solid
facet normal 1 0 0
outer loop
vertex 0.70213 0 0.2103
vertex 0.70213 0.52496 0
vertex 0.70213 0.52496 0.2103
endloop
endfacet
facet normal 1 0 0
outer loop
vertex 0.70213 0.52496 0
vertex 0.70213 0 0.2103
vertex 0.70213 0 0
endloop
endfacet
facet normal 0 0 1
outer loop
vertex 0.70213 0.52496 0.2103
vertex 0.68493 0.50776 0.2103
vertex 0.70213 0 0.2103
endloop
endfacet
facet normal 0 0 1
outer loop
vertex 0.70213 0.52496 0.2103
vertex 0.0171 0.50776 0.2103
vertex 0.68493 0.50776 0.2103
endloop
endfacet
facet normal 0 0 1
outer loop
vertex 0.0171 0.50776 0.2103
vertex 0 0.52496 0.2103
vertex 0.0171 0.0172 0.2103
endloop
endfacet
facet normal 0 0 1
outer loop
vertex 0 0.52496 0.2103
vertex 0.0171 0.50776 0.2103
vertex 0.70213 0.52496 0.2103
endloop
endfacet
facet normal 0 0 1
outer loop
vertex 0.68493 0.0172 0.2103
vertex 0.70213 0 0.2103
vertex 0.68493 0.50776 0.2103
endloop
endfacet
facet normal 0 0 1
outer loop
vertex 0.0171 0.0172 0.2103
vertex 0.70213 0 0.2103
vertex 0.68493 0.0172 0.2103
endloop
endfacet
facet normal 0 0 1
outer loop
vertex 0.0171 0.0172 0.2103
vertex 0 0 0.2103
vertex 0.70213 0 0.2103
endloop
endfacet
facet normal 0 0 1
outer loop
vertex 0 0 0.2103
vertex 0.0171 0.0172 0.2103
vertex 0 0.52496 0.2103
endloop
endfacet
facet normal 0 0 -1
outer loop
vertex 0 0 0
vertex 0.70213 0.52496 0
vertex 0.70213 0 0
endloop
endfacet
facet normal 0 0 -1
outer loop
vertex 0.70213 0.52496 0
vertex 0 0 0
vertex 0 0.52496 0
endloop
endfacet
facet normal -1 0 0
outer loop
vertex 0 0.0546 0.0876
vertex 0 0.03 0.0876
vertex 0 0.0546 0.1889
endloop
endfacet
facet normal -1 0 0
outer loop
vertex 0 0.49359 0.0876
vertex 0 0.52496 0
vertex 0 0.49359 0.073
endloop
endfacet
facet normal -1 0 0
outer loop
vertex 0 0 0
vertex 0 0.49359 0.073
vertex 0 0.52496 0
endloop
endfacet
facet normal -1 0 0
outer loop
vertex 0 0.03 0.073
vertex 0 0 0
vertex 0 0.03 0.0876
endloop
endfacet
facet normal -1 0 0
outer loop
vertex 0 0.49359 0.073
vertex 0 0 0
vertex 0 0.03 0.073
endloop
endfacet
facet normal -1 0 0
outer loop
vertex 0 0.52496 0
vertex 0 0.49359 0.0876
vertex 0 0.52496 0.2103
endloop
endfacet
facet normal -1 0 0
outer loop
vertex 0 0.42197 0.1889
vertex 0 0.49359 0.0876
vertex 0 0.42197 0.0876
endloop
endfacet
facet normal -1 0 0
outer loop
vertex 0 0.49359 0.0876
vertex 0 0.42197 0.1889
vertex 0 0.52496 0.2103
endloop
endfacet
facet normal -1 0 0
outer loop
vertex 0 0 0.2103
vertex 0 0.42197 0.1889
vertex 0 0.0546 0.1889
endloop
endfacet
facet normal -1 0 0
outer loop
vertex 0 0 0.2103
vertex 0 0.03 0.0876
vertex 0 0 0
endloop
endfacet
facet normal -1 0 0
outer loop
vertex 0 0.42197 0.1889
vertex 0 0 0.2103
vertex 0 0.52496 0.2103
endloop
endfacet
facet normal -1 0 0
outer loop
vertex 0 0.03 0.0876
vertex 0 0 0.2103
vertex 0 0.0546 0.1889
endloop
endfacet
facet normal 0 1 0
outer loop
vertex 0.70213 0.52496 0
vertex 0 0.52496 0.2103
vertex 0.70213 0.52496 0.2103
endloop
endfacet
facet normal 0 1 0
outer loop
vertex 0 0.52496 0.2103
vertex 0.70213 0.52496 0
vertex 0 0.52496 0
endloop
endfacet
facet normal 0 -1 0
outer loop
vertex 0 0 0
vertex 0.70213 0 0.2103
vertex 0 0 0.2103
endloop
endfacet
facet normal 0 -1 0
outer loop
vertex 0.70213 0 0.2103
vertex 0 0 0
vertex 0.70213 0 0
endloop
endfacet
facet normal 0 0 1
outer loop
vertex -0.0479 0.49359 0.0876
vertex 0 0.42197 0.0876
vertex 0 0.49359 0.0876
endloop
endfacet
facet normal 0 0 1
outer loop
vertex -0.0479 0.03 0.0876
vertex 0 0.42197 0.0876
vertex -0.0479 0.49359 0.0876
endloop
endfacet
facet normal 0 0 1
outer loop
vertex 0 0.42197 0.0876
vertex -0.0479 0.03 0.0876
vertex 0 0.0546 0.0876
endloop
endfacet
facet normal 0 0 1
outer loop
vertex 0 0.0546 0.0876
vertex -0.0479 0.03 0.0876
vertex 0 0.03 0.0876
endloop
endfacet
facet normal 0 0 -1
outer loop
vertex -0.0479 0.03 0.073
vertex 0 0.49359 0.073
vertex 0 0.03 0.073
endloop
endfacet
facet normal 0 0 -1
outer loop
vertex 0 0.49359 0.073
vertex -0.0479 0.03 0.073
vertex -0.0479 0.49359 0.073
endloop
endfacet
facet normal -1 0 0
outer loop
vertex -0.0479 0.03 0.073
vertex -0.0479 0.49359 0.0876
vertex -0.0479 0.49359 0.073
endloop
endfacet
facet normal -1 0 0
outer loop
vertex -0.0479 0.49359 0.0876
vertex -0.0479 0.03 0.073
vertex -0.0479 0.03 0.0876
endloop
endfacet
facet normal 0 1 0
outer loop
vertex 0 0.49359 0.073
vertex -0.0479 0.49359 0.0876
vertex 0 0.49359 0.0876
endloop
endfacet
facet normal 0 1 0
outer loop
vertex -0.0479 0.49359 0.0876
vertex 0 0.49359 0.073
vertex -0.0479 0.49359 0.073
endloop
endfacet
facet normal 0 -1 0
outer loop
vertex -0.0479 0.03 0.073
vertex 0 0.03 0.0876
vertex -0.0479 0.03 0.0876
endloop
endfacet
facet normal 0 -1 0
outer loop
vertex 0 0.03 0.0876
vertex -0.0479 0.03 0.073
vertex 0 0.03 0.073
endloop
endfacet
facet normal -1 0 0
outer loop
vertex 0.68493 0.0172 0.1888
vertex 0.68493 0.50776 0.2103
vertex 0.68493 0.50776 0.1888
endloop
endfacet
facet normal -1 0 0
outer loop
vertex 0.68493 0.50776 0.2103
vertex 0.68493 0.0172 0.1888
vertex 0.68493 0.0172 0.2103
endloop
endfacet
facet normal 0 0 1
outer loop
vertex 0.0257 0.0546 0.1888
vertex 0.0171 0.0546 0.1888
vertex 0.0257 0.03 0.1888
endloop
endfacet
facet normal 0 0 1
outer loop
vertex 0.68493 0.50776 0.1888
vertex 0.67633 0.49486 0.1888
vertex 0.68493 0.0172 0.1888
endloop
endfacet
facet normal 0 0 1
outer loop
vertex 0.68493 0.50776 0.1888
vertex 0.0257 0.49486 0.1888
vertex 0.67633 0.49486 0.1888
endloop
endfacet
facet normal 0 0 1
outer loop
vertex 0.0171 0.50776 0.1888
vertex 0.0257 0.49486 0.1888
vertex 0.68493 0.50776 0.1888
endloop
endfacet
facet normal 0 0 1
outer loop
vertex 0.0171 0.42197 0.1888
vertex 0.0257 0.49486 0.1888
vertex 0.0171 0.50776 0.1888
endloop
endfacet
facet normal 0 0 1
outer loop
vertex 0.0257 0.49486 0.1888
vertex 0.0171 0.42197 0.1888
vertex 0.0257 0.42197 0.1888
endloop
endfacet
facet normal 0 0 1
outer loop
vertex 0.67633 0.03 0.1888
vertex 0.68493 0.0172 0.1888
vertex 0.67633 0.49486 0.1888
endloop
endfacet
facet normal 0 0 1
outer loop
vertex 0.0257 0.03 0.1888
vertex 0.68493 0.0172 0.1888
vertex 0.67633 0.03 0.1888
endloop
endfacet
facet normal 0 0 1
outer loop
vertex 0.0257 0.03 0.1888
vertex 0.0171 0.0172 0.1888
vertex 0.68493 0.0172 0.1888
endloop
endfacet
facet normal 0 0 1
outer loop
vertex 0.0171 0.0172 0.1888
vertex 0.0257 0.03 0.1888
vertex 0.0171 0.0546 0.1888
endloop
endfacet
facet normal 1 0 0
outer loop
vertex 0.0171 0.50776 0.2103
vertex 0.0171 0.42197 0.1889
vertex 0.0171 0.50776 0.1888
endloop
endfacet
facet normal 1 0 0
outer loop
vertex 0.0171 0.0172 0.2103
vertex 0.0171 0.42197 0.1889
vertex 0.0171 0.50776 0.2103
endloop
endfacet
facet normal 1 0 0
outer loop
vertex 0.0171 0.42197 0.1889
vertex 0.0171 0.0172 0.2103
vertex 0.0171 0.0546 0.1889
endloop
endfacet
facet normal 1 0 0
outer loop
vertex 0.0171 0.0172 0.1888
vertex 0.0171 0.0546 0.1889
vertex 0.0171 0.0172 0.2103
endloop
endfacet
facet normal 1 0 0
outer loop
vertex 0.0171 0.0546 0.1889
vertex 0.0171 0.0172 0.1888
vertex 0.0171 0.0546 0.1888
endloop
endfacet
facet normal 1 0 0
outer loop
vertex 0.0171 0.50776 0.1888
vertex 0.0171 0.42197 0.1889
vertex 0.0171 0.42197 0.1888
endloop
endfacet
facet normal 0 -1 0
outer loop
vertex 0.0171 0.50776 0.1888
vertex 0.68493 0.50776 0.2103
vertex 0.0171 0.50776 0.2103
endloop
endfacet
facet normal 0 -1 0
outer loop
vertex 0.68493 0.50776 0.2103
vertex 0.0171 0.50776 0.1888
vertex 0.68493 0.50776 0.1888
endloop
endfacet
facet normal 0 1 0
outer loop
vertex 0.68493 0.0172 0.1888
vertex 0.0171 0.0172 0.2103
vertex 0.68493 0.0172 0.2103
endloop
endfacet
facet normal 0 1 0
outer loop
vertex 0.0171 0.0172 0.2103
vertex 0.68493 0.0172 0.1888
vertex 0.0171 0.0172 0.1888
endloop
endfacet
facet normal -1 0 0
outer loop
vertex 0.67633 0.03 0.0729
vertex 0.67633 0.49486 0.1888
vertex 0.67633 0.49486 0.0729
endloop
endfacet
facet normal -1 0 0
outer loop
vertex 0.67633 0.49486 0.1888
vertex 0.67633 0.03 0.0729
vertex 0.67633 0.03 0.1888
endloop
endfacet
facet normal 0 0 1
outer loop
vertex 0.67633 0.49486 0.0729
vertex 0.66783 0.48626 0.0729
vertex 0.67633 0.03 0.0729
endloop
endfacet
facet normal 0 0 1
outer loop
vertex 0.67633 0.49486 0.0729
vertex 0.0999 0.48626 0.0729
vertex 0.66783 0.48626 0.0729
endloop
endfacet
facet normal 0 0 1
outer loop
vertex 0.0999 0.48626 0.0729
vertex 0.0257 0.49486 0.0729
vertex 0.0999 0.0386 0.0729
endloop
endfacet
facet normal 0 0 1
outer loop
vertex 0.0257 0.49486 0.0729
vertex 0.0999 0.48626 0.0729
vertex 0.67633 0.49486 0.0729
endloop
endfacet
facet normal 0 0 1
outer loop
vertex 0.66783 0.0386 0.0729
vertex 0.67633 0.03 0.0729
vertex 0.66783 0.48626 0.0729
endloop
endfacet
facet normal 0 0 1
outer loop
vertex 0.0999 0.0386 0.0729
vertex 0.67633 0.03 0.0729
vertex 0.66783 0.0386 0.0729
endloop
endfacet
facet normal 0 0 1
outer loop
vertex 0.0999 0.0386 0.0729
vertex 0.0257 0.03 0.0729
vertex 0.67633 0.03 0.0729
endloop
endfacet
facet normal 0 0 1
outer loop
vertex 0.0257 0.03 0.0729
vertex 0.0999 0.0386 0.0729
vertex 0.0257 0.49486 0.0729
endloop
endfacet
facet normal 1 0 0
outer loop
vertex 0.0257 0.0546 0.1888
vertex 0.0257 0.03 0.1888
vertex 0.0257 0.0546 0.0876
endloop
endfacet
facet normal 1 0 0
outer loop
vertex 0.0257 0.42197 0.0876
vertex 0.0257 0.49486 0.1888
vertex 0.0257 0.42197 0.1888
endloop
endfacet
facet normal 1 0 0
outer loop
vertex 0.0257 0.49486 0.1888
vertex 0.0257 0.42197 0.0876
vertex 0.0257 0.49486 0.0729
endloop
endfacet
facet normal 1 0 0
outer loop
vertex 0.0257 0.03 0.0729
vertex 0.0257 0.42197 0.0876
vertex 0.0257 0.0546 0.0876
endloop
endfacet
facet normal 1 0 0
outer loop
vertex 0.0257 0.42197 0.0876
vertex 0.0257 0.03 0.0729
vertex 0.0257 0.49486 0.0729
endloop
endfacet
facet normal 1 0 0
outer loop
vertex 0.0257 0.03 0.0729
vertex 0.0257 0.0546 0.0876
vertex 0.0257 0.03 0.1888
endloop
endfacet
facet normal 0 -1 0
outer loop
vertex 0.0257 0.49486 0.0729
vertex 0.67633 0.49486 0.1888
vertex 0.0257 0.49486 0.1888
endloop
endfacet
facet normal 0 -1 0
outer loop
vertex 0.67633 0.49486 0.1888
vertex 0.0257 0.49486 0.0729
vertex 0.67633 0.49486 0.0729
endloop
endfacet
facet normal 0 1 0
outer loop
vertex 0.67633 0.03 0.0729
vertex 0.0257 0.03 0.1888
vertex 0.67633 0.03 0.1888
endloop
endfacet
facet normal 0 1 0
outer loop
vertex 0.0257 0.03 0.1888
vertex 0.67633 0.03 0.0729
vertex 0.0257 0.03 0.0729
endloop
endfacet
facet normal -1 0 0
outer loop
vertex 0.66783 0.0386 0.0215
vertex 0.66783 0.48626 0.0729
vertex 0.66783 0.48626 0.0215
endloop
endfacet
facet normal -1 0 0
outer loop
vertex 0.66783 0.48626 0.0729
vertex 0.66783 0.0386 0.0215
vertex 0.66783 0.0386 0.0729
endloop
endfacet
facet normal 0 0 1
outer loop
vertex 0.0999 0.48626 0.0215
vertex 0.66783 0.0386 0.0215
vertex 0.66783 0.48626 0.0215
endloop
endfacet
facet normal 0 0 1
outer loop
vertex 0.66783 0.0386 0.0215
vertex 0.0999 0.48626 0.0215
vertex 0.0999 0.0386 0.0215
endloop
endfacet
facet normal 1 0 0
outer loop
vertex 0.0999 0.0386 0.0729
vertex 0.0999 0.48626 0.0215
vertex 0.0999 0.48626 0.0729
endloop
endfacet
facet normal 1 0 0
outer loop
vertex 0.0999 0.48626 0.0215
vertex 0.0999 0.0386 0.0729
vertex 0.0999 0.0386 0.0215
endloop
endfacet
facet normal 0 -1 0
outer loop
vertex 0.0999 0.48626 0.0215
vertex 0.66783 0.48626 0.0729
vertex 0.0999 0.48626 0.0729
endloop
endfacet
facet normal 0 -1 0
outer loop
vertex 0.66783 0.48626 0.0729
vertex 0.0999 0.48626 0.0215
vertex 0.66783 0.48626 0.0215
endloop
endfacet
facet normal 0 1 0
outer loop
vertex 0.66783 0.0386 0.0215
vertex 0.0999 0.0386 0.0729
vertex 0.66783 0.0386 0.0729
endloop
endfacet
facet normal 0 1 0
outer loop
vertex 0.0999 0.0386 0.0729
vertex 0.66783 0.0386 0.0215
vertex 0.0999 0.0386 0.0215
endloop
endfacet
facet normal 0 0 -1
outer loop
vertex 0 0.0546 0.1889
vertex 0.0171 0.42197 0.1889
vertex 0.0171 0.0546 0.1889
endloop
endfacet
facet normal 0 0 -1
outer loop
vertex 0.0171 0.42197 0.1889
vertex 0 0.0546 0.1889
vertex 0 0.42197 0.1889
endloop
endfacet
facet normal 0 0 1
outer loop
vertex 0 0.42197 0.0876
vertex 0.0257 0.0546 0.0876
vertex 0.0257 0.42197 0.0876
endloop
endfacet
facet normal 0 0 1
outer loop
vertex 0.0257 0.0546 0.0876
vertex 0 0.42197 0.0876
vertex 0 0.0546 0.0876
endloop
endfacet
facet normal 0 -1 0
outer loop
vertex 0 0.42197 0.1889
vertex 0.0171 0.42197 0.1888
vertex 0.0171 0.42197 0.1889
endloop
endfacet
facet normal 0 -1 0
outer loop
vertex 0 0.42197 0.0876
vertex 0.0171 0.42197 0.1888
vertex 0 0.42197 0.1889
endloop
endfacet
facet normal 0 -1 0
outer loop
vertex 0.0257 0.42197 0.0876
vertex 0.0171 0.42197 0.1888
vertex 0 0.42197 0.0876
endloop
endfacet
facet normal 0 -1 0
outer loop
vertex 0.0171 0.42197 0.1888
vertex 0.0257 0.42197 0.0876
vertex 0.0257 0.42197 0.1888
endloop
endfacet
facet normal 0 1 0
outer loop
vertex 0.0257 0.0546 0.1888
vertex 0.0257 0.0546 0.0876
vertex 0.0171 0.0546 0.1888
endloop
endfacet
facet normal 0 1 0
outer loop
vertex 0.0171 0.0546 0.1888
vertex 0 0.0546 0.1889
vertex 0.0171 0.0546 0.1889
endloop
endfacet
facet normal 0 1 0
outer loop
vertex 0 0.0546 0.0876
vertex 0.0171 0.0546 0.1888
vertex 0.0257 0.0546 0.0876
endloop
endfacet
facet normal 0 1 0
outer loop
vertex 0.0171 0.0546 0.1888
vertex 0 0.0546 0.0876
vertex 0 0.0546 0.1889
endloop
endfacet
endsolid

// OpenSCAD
// --------------------------
// Global Settings
// --------------------------
$fn = 100; // Curve resolution for smooth geometry

// --------------------------
// Main Body Dimensions
// --------------------------
main_length = 0.702127;   // X-axis (length) dimension
main_width = 0.524964;    // Y-axis (width) dimension
main_height = 0.2103;     // Z-axis (total height, z=0 = underside)

// --------------------------
// Top Shallow Recess Parameters
// --------------------------
top_recess_inset_left = 0.0171;
top_recess_inset_right = 0.0172;
top_recess_inset_front = 0.0172;
top_recess_inset_back = 0.0172;
top_recess_z_start = 0.1888;
top_recess_z_end = main_height;
top_recess_depth = top_recess_z_end - top_recess_z_start; // Matches specified 0.0215

// --------------------------
// Middle Recess (Continuation) Parameters
// --------------------------
middle_cut_inset_left = 0.0257;
middle_cut_inset_right = 0.0258;
middle_cut_inset_front = 0.03;
middle_cut_inset_back = 0.0301;
middle_cut_z_start = 0.0729;
middle_cut_z_end = 0.1888;
middle_cut_depth = middle_cut_z_end - middle_cut_z_start; // Matches specified 0.1159

// --------------------------
// Lower Pocket Parameters
// --------------------------
lower_pocket_inset_left = 0.0999;
lower_pocket_inset_right = 0.0343;
lower_pocket_inset_front = 0.0386;
lower_pocket_inset_back = 0.0387;
lower_pocket_z_start = 0.0215;
lower_pocket_z_end = 0.073;
lower_pocket_depth = lower_pocket_z_end - lower_pocket_z_start; // Matches specified 0.0515

// --------------------------
// Left Side Projection Parameters
// --------------------------
side_proj_overhang_left = 0.0479;
side_proj_length = 0.130618;
side_proj_width = 0.463588;
side_proj_inset_front = 0.03;
side_proj_inset_back = 0.0314;
side_proj_z_start = 0.073;
side_proj_z_end = 0.0876;
side_proj_thickness = side_proj_z_end - side_proj_z_start; // Matches specified 0.0146

// --------------------------
// Left Side Recess Parameters
// --------------------------
side_recess_depth = 0.0343;
side_recess_y_inset_front = 0.0546;
side_recess_y_length = 0.367372;
side_recess_z_start = 0.0876;
side_recess_z_end = 0.1889;
side_recess_z_height = side_recess_z_end - side_recess_z_start; // Matches specified 0.101285

// --------------------------
// Main Model Construction
// --------------------------
difference() {
    // Base solid: main body + side projection
    union() {
        // Primary reference block
        cube([main_length, main_width, main_height]);
        
        // Added left side projection
        translate([
            -side_proj_overhang_left,
            side_proj_inset_front,
            side_proj_z_start
        ])
        cube([side_proj_length, side_proj_width, side_proj_thickness]);
    }

    // Cut 1: Top shallow recess
    translate([
        top_recess_inset_left,
        top_recess_inset_front,
        top_recess_z_start
    ])
    cube([
        main_length - top_recess_inset_left - top_recess_inset_right,
        main_width - top_recess_inset_front - top_recess_inset_back,
        top_recess_depth
    ]);

    // Cut 2: Middle continuation recess
    translate([
        middle_cut_inset_left,
        middle_cut_inset_front,
        middle_cut_z_start
    ])
    cube([
        main_length - middle_cut_inset_left - middle_cut_inset_right,
        main_width - middle_cut_inset_front - middle_cut_inset_back,
        middle_cut_depth
    ]);

    // Cut 3: Lower contained pocket
    translate([
        lower_pocket_inset_left,
        lower_pocket_inset_front,
        lower_pocket_z_start
    ])
    cube([
        main_length - lower_pocket_inset_left - lower_pocket_inset_right,
        main_width - lower_pocket_inset_front - lower_pocket_inset_back,
        lower_pocket_depth
    ]);

    // Cut 4: Left side recess
    translate([
        0,
        side_recess_y_inset_front,
        side_recess_z_start
    ])
    cube([side_recess_depth, side_recess_y_length, side_recess_z_height]);
}
